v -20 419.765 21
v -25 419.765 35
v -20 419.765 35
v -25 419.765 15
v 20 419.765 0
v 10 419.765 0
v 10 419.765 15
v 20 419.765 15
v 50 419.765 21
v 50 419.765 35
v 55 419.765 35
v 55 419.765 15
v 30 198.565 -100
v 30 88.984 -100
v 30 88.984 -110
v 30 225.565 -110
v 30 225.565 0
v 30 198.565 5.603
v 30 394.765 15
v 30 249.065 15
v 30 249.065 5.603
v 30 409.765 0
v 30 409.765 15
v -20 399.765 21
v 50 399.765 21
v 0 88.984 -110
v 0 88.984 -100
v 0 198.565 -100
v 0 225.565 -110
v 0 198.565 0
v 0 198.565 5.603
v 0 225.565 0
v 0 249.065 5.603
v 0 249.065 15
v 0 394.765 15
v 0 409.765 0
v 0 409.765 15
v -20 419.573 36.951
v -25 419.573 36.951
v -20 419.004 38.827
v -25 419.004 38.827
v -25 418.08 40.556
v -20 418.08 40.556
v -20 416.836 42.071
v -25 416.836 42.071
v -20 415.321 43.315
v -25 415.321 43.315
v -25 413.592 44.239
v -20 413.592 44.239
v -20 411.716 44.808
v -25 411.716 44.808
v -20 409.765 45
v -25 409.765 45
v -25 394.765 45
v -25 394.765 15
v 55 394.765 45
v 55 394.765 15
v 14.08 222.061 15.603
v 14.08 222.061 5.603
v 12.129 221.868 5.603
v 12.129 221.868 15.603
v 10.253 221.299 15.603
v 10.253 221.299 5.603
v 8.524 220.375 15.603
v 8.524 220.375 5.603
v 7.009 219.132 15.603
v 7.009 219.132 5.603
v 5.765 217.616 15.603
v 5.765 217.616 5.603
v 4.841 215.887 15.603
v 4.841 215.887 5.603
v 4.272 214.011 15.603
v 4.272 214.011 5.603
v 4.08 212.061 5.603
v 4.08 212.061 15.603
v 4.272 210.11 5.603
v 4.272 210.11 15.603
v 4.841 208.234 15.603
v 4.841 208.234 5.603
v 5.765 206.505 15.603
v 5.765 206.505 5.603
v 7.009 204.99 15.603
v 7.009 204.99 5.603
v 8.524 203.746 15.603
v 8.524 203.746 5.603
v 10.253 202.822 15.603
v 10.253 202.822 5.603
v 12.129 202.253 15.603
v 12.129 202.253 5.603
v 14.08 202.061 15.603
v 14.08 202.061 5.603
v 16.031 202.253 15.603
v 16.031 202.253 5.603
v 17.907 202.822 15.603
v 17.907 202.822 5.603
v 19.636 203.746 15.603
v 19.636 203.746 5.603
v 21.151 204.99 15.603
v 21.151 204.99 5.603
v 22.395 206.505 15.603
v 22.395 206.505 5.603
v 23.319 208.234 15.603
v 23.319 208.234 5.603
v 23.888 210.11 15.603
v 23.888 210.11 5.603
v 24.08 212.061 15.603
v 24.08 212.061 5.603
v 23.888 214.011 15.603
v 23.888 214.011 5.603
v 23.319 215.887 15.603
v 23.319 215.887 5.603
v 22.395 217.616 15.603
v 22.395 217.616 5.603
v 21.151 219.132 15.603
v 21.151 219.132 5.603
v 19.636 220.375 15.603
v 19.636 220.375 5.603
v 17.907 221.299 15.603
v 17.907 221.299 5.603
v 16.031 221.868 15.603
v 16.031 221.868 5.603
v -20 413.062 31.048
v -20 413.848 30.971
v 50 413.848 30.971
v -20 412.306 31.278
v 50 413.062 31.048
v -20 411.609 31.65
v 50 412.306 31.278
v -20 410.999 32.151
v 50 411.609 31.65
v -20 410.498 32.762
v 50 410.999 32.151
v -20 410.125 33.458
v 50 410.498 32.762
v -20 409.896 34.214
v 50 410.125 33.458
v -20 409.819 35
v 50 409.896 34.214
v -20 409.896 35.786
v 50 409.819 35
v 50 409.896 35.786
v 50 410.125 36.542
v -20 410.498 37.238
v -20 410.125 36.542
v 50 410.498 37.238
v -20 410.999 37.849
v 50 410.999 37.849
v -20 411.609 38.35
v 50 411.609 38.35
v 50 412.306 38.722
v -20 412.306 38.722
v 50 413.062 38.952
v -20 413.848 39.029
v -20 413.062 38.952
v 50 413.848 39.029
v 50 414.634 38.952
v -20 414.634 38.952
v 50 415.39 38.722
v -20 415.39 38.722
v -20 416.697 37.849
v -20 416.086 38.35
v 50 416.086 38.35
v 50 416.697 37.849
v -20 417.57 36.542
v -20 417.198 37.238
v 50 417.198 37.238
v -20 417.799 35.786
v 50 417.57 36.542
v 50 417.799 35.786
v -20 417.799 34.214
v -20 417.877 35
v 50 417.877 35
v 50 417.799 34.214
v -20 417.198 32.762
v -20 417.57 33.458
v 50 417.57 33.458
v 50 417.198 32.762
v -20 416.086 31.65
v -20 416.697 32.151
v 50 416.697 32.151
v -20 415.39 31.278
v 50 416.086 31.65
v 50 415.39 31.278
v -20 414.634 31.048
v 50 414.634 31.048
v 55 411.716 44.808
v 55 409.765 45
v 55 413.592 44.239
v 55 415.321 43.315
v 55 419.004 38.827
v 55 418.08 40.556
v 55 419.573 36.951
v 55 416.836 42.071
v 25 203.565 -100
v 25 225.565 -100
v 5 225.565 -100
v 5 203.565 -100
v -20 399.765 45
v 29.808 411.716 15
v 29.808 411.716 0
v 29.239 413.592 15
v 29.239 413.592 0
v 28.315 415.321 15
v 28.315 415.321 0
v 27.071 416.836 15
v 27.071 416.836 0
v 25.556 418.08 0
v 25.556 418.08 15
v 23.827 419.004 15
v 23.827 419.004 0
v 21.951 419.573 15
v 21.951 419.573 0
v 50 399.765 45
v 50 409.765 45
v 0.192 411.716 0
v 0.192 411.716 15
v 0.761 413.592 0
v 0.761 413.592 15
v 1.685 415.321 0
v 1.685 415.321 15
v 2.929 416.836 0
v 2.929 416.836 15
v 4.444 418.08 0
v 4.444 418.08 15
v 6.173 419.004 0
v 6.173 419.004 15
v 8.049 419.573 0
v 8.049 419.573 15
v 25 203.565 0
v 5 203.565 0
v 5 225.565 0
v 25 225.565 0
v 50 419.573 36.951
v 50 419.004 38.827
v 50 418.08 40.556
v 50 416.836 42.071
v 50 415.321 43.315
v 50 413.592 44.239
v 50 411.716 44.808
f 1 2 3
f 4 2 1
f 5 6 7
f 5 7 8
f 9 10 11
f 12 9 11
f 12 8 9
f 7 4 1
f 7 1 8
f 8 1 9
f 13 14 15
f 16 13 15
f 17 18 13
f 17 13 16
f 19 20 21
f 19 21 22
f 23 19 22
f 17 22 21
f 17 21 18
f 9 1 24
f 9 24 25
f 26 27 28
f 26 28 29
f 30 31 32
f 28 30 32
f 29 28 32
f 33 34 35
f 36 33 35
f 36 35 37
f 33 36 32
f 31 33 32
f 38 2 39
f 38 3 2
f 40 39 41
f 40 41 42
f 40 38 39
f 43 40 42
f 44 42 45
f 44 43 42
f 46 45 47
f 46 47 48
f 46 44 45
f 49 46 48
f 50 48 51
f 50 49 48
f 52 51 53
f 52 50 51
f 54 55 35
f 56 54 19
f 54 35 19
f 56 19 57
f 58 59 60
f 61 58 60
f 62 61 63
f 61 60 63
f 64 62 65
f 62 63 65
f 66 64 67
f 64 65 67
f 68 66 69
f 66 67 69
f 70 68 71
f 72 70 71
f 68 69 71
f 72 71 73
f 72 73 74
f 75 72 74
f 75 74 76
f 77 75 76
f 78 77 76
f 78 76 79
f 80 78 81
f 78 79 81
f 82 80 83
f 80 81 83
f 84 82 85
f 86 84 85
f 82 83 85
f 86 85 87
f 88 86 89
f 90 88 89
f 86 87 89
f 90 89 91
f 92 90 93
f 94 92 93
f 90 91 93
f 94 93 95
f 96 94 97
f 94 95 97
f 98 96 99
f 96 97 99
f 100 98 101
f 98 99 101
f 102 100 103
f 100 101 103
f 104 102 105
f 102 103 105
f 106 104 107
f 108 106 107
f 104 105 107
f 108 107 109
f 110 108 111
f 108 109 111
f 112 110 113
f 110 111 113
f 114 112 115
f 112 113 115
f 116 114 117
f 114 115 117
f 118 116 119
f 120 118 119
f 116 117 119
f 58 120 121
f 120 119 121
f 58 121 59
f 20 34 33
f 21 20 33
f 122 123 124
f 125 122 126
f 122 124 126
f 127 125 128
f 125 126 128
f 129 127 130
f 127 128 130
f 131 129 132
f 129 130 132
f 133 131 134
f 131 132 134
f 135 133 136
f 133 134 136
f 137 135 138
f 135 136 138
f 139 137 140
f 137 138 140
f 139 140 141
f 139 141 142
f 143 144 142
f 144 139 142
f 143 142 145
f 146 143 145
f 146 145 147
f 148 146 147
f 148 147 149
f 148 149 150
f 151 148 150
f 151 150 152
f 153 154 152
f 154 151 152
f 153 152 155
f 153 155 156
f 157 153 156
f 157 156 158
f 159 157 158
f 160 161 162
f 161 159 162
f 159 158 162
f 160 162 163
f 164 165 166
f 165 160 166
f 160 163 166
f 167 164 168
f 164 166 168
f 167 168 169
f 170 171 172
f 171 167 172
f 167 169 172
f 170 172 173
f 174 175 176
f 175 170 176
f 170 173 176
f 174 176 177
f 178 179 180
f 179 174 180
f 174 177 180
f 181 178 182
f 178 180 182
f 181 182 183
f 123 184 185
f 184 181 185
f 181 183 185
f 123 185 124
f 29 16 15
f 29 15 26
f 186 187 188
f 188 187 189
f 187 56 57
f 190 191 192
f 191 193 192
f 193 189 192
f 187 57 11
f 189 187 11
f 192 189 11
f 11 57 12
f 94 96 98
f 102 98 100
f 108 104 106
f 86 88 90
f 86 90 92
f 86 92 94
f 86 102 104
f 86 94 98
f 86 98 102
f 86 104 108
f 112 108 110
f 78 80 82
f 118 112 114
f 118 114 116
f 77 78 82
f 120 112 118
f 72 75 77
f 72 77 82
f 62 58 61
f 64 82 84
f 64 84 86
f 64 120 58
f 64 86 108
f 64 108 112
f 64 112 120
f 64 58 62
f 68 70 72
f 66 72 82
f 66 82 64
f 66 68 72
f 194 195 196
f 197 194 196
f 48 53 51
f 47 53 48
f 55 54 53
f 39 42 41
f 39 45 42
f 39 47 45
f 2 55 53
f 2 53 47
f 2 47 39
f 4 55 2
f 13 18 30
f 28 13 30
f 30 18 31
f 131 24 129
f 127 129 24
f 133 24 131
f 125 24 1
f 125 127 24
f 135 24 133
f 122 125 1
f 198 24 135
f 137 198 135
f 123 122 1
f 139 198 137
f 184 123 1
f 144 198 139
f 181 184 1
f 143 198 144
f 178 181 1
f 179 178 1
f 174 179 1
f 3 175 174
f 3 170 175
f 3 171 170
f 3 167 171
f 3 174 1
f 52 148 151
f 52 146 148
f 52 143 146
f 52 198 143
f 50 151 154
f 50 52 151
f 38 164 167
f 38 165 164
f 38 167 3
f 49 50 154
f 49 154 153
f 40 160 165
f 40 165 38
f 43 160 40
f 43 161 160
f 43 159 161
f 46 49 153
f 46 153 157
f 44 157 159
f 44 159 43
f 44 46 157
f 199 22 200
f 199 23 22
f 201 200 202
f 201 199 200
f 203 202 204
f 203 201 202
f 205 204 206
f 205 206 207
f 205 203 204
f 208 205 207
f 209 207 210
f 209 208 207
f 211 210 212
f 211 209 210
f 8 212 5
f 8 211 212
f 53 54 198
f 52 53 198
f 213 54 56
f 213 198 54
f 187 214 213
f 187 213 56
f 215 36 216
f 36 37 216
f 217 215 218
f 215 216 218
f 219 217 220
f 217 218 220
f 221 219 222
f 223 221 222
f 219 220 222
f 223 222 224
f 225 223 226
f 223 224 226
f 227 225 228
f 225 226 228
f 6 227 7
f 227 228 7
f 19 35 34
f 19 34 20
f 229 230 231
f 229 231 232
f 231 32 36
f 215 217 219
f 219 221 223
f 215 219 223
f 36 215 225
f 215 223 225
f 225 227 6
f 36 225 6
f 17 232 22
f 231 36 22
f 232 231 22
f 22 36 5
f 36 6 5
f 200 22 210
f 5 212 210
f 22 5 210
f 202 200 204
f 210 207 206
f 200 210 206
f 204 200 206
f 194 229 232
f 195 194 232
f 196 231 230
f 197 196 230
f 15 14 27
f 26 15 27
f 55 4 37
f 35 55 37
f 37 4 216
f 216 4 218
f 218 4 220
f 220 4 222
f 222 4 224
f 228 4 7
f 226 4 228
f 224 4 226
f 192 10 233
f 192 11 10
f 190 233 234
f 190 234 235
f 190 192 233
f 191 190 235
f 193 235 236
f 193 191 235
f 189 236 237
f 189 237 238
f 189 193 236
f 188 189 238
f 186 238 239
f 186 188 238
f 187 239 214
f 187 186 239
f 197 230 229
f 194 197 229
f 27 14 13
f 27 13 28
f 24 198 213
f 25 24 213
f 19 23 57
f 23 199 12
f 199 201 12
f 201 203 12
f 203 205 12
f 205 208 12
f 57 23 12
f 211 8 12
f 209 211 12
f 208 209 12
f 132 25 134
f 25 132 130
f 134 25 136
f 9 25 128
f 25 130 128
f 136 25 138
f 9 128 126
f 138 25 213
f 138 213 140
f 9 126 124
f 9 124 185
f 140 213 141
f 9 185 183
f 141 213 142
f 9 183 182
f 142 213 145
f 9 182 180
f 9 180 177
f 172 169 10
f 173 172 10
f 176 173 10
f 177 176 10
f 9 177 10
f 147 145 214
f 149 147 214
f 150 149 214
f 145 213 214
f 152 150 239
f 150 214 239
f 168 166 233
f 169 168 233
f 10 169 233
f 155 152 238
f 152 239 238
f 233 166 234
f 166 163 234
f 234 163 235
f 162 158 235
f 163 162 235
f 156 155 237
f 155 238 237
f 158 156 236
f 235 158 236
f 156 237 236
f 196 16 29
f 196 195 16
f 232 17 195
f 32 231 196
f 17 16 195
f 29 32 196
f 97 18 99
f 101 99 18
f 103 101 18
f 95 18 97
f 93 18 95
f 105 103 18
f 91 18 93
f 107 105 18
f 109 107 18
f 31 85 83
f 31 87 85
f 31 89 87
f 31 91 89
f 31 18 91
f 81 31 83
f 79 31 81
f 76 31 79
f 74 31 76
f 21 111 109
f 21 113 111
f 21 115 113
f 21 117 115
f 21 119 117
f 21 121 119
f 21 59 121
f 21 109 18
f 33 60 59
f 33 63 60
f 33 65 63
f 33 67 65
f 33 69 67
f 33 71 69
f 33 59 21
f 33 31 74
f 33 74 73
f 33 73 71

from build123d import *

# Parameters (mm, degrees)
SKETCH1_W                       = 30
SKETCH1_H                       = 194.2
SKETCH1_H_2                     = 27
SKETCH1_H_3                     = 261.4
EXTRUDE1_DEPTH                  = 15
FILLET1_R                       = 10
EXTRUDE2_DEPTH                  = 10
SKETCH3_W                       = 80
SKETCH3_H                       = 25
EXTRUDE3_DEPTH                  = 30
SKETCH5_W                       = 70
SKETCH5_H                       = 20
EXTRUDE4_DEPTH                  = 24
FILLET2_R                       = 10
EXTRUDE5_REACH                  = 432.349
SKETCH6_R                       = 4.029178008
SKETCH7_W                       = 30
SKETCH7_H                       = 263.372286267
EXTRUDE6_DEPTH                  = 427.91910061
EXTRUDE7_DEPTH                  = 100
SKETCH9_W                       = 30
SKETCH9_H                       = 136.58118173
EXTRUDE8_DEPTH                  = 10
F_1_4_0_25_DIAMETER_HOLE1_D     = 6.35
F_1_4_0_25_DIAMETER_HOLE1_DEPTH = 10
F_1_4_0_25_DIAMETER_HOLE1_TIP   = 1.907732465
EXTRUDE10_DEPTH                 = 439.560051151
EXTRUDE10_DEPTH_BACK            = 439.560051151
SKETCH11_W                      = 9.397052114
SKETCH11_H                      = 50.5
SKETCH12_R                      = 10
EXTRUDE11_DEPTH                 = 10


with BuildPart() as part:
    # Sketch1 → Extrude1 (new body)
    with BuildSketch(Plane.XY):
        with Locations((15, 322.665015772)):
            Rectangle(SKETCH1_W, SKETCH1_H)
        with BuildLine():
            Line((30, 225.565015772), (30, 198.565015772))
            Line((30, 198.565015772), (50, 198.565015772))
            ThreePointArc((50, 198.565015772), (63.5, 212.065015772), (50, 225.565015772))
            Line((50, 225.565015772), (30, 225.565015772))
        make_face()
        with Locations((15, 212.065015772)):
            Rectangle(SKETCH1_W, SKETCH1_H_2)
        with BuildLine():
            Line((-20, 198.565015772), (0, 198.565015772))
            Line((0, 198.565015772), (0, 225.565015772))
            Line((0, 225.565015772), (-20, 225.565015772))
            ThreePointArc((-20, 225.565015772), (-33.5, 212.065015772), (-20, 198.565015772))
        make_face()
        with Locations((15, 67.865015772)):
            Rectangle(SKETCH1_W, SKETCH1_H_3)
    extrude(amount=EXTRUDE1_DEPTH)

    # Fillet1
    fillet1_edges = [part.edges().sort_by_distance(p)[0] for p in [
        (0, 419.765015772, 7.5),
        (30, 419.765015772, 7.5),
        (30, -62.834984228, 7.5),
        (0, -62.834984228, 7.5),
    ]]
    fillet(fillet1_edges, radius=FILLET1_R)

    # Sketch2 → Extrude2 (cut)
    with BuildSketch(Plane(origin=(0, 0, 0), x_dir=(-1, 0, 0), z_dir=(0, 0, -1))):
        with BuildLine():
            Line((-50, 225.565015772), (-30, 225.565015772))
            Line((-30, 225.565015772), (-30, 198.565015772))
            Line((-30, 198.565015772), (-50, 198.565015772))
            ThreePointArc((-50, 198.565015772), (-63.5, 212.065015772), (-50, 225.565015772))
        make_face()
        with BuildLine():
            Line((0, 198.565015772), (20, 198.565015772))
            ThreePointArc((20, 198.565015772), (33.5, 212.065015772), (20, 225.565015772))
            Line((20, 225.565015772), (0, 225.565015772))
            Line((0, 225.565015772), (0, 198.565015772))
        make_face()
    extrude(amount=-EXTRUDE2_DEPTH, mode=Mode.SUBTRACT)

    # Sketch3 → Extrude3 (add)
    with BuildSketch(Plane.XY.offset(15)):
        with Locations((15, 407.265015772)):
            Rectangle(SKETCH3_W, SKETCH3_H)
    extrude(amount=EXTRUDE3_DEPTH)

    # Sketch5 → Extrude4 (cut)
    with BuildSketch(Plane.XY.offset(45)):
        with Locations((15, 409.765015772)):
            Rectangle(SKETCH5_W, SKETCH5_H)
    extrude(amount=-EXTRUDE4_DEPTH, mode=Mode.SUBTRACT)

    # Fillet2
    fillet2_edges = [part.edges().sort_by_distance(p)[0] for p in [
        (52.5, 419.765015772, 45),
        (-22.5, 419.765015772, 45),
    ]]
    fillet(fillet2_edges, radius=FILLET2_R)

    # Sketch6 → Extrude5 (add, up to next)
    with BuildSketch(Plane.ZY.offset(-50), mode=Mode.PRIVATE) as extrude5_sk1:
        with Locations(Location((35, 413.847695375, 0), (0, 0, 180))):
            Circle(SKETCH6_R)
    extrude5_tool1 = extrude(extrude5_sk1.sketch, amount=EXTRUDE5_REACH, mode=Mode.PRIVATE) - part.part
    add(extrude5_tool1.solids().sort_by_distance((50, 413.847695, 35))[0])

    # Sketch7 → Extrude6 (cut, through all)
    with BuildSketch(Plane(origin=(0, 0, 0), x_dir=(-1, 0, 0), z_dir=(0, 0, -1))):
        with Locations((-15, 66.878872639)):
            Rectangle(SKETCH7_W, SKETCH7_H)
    extrude(amount=-EXTRUDE6_DEPTH, mode=Mode.SUBTRACT)

    # Sketch8 → Extrude7 (add)
    with BuildSketch(Plane(origin=(0, 0, 0), x_dir=(-1, 0, 0), z_dir=(0, 0, -1))):
        Polygon((-30, 198.565015772), (0, 198.565015772), (0, 225.565015772), (-5, 225.565015772), (-5, 203.565015772), (-25, 203.565015772), (-25, 225.565015772), (-30, 225.565015772), align=None)
    extrude(amount=EXTRUDE7_DEPTH)

    # Sketch9 → Extrude8 (add)
    with BuildSketch(Plane(origin=(0, 0, -100), x_dir=(-1, 0, 0), z_dir=(0, 0, -1))):
        with Locations((-15, 157.274424907)):
            Rectangle(SKETCH9_W, SKETCH9_H)
    extrude(amount=EXTRUDE8_DEPTH)

    # 1/4 (0.25) Diameter Hole1
    with Locations(Plane(origin=(-20, 212.065015772, 10), x_dir=(-1, 0, 0), z_dir=(0, 0, -1))):
        with Locations((0, 0), (-70, 0)):
            Hole(F_1_4_0_25_DIAMETER_HOLE1_D / 2, depth=F_1_4_0_25_DIAMETER_HOLE1_DEPTH)
            with Locations((0, 0, -(F_1_4_0_25_DIAMETER_HOLE1_DEPTH + F_1_4_0_25_DIAMETER_HOLE1_TIP / 2))):  # 118° drill point
                Cone(0, F_1_4_0_25_DIAMETER_HOLE1_D / 2, F_1_4_0_25_DIAMETER_HOLE1_TIP, mode=Mode.SUBTRACT)

    # Sketch11 → Extrude10 (cut, two sides: drawn at the far end of the back side and taken through both)
    with BuildSketch(Plane(origin=(30, 0, 0), x_dir=(0, 0, -1), z_dir=(1, 0, 0)).offset(-EXTRUDE10_DEPTH_BACK)):
        with Locations((-10.301473943, 223.815015772)):
            Rectangle(SKETCH11_W, SKETCH11_H)
    extrude(amount=EXTRUDE10_DEPTH + EXTRUDE10_DEPTH_BACK, mode=Mode.SUBTRACT)

    # Sketch12 → Extrude11 (add)
    with BuildSketch(Plane.XY.offset(5.602947886)):
        with Locations(Location((14.080124671, 212.060594596, 0), (0, 0, 90))):
            Circle(SKETCH12_R)
    extrude(amount=EXTRUDE11_DEPTH)


solid = part.part
